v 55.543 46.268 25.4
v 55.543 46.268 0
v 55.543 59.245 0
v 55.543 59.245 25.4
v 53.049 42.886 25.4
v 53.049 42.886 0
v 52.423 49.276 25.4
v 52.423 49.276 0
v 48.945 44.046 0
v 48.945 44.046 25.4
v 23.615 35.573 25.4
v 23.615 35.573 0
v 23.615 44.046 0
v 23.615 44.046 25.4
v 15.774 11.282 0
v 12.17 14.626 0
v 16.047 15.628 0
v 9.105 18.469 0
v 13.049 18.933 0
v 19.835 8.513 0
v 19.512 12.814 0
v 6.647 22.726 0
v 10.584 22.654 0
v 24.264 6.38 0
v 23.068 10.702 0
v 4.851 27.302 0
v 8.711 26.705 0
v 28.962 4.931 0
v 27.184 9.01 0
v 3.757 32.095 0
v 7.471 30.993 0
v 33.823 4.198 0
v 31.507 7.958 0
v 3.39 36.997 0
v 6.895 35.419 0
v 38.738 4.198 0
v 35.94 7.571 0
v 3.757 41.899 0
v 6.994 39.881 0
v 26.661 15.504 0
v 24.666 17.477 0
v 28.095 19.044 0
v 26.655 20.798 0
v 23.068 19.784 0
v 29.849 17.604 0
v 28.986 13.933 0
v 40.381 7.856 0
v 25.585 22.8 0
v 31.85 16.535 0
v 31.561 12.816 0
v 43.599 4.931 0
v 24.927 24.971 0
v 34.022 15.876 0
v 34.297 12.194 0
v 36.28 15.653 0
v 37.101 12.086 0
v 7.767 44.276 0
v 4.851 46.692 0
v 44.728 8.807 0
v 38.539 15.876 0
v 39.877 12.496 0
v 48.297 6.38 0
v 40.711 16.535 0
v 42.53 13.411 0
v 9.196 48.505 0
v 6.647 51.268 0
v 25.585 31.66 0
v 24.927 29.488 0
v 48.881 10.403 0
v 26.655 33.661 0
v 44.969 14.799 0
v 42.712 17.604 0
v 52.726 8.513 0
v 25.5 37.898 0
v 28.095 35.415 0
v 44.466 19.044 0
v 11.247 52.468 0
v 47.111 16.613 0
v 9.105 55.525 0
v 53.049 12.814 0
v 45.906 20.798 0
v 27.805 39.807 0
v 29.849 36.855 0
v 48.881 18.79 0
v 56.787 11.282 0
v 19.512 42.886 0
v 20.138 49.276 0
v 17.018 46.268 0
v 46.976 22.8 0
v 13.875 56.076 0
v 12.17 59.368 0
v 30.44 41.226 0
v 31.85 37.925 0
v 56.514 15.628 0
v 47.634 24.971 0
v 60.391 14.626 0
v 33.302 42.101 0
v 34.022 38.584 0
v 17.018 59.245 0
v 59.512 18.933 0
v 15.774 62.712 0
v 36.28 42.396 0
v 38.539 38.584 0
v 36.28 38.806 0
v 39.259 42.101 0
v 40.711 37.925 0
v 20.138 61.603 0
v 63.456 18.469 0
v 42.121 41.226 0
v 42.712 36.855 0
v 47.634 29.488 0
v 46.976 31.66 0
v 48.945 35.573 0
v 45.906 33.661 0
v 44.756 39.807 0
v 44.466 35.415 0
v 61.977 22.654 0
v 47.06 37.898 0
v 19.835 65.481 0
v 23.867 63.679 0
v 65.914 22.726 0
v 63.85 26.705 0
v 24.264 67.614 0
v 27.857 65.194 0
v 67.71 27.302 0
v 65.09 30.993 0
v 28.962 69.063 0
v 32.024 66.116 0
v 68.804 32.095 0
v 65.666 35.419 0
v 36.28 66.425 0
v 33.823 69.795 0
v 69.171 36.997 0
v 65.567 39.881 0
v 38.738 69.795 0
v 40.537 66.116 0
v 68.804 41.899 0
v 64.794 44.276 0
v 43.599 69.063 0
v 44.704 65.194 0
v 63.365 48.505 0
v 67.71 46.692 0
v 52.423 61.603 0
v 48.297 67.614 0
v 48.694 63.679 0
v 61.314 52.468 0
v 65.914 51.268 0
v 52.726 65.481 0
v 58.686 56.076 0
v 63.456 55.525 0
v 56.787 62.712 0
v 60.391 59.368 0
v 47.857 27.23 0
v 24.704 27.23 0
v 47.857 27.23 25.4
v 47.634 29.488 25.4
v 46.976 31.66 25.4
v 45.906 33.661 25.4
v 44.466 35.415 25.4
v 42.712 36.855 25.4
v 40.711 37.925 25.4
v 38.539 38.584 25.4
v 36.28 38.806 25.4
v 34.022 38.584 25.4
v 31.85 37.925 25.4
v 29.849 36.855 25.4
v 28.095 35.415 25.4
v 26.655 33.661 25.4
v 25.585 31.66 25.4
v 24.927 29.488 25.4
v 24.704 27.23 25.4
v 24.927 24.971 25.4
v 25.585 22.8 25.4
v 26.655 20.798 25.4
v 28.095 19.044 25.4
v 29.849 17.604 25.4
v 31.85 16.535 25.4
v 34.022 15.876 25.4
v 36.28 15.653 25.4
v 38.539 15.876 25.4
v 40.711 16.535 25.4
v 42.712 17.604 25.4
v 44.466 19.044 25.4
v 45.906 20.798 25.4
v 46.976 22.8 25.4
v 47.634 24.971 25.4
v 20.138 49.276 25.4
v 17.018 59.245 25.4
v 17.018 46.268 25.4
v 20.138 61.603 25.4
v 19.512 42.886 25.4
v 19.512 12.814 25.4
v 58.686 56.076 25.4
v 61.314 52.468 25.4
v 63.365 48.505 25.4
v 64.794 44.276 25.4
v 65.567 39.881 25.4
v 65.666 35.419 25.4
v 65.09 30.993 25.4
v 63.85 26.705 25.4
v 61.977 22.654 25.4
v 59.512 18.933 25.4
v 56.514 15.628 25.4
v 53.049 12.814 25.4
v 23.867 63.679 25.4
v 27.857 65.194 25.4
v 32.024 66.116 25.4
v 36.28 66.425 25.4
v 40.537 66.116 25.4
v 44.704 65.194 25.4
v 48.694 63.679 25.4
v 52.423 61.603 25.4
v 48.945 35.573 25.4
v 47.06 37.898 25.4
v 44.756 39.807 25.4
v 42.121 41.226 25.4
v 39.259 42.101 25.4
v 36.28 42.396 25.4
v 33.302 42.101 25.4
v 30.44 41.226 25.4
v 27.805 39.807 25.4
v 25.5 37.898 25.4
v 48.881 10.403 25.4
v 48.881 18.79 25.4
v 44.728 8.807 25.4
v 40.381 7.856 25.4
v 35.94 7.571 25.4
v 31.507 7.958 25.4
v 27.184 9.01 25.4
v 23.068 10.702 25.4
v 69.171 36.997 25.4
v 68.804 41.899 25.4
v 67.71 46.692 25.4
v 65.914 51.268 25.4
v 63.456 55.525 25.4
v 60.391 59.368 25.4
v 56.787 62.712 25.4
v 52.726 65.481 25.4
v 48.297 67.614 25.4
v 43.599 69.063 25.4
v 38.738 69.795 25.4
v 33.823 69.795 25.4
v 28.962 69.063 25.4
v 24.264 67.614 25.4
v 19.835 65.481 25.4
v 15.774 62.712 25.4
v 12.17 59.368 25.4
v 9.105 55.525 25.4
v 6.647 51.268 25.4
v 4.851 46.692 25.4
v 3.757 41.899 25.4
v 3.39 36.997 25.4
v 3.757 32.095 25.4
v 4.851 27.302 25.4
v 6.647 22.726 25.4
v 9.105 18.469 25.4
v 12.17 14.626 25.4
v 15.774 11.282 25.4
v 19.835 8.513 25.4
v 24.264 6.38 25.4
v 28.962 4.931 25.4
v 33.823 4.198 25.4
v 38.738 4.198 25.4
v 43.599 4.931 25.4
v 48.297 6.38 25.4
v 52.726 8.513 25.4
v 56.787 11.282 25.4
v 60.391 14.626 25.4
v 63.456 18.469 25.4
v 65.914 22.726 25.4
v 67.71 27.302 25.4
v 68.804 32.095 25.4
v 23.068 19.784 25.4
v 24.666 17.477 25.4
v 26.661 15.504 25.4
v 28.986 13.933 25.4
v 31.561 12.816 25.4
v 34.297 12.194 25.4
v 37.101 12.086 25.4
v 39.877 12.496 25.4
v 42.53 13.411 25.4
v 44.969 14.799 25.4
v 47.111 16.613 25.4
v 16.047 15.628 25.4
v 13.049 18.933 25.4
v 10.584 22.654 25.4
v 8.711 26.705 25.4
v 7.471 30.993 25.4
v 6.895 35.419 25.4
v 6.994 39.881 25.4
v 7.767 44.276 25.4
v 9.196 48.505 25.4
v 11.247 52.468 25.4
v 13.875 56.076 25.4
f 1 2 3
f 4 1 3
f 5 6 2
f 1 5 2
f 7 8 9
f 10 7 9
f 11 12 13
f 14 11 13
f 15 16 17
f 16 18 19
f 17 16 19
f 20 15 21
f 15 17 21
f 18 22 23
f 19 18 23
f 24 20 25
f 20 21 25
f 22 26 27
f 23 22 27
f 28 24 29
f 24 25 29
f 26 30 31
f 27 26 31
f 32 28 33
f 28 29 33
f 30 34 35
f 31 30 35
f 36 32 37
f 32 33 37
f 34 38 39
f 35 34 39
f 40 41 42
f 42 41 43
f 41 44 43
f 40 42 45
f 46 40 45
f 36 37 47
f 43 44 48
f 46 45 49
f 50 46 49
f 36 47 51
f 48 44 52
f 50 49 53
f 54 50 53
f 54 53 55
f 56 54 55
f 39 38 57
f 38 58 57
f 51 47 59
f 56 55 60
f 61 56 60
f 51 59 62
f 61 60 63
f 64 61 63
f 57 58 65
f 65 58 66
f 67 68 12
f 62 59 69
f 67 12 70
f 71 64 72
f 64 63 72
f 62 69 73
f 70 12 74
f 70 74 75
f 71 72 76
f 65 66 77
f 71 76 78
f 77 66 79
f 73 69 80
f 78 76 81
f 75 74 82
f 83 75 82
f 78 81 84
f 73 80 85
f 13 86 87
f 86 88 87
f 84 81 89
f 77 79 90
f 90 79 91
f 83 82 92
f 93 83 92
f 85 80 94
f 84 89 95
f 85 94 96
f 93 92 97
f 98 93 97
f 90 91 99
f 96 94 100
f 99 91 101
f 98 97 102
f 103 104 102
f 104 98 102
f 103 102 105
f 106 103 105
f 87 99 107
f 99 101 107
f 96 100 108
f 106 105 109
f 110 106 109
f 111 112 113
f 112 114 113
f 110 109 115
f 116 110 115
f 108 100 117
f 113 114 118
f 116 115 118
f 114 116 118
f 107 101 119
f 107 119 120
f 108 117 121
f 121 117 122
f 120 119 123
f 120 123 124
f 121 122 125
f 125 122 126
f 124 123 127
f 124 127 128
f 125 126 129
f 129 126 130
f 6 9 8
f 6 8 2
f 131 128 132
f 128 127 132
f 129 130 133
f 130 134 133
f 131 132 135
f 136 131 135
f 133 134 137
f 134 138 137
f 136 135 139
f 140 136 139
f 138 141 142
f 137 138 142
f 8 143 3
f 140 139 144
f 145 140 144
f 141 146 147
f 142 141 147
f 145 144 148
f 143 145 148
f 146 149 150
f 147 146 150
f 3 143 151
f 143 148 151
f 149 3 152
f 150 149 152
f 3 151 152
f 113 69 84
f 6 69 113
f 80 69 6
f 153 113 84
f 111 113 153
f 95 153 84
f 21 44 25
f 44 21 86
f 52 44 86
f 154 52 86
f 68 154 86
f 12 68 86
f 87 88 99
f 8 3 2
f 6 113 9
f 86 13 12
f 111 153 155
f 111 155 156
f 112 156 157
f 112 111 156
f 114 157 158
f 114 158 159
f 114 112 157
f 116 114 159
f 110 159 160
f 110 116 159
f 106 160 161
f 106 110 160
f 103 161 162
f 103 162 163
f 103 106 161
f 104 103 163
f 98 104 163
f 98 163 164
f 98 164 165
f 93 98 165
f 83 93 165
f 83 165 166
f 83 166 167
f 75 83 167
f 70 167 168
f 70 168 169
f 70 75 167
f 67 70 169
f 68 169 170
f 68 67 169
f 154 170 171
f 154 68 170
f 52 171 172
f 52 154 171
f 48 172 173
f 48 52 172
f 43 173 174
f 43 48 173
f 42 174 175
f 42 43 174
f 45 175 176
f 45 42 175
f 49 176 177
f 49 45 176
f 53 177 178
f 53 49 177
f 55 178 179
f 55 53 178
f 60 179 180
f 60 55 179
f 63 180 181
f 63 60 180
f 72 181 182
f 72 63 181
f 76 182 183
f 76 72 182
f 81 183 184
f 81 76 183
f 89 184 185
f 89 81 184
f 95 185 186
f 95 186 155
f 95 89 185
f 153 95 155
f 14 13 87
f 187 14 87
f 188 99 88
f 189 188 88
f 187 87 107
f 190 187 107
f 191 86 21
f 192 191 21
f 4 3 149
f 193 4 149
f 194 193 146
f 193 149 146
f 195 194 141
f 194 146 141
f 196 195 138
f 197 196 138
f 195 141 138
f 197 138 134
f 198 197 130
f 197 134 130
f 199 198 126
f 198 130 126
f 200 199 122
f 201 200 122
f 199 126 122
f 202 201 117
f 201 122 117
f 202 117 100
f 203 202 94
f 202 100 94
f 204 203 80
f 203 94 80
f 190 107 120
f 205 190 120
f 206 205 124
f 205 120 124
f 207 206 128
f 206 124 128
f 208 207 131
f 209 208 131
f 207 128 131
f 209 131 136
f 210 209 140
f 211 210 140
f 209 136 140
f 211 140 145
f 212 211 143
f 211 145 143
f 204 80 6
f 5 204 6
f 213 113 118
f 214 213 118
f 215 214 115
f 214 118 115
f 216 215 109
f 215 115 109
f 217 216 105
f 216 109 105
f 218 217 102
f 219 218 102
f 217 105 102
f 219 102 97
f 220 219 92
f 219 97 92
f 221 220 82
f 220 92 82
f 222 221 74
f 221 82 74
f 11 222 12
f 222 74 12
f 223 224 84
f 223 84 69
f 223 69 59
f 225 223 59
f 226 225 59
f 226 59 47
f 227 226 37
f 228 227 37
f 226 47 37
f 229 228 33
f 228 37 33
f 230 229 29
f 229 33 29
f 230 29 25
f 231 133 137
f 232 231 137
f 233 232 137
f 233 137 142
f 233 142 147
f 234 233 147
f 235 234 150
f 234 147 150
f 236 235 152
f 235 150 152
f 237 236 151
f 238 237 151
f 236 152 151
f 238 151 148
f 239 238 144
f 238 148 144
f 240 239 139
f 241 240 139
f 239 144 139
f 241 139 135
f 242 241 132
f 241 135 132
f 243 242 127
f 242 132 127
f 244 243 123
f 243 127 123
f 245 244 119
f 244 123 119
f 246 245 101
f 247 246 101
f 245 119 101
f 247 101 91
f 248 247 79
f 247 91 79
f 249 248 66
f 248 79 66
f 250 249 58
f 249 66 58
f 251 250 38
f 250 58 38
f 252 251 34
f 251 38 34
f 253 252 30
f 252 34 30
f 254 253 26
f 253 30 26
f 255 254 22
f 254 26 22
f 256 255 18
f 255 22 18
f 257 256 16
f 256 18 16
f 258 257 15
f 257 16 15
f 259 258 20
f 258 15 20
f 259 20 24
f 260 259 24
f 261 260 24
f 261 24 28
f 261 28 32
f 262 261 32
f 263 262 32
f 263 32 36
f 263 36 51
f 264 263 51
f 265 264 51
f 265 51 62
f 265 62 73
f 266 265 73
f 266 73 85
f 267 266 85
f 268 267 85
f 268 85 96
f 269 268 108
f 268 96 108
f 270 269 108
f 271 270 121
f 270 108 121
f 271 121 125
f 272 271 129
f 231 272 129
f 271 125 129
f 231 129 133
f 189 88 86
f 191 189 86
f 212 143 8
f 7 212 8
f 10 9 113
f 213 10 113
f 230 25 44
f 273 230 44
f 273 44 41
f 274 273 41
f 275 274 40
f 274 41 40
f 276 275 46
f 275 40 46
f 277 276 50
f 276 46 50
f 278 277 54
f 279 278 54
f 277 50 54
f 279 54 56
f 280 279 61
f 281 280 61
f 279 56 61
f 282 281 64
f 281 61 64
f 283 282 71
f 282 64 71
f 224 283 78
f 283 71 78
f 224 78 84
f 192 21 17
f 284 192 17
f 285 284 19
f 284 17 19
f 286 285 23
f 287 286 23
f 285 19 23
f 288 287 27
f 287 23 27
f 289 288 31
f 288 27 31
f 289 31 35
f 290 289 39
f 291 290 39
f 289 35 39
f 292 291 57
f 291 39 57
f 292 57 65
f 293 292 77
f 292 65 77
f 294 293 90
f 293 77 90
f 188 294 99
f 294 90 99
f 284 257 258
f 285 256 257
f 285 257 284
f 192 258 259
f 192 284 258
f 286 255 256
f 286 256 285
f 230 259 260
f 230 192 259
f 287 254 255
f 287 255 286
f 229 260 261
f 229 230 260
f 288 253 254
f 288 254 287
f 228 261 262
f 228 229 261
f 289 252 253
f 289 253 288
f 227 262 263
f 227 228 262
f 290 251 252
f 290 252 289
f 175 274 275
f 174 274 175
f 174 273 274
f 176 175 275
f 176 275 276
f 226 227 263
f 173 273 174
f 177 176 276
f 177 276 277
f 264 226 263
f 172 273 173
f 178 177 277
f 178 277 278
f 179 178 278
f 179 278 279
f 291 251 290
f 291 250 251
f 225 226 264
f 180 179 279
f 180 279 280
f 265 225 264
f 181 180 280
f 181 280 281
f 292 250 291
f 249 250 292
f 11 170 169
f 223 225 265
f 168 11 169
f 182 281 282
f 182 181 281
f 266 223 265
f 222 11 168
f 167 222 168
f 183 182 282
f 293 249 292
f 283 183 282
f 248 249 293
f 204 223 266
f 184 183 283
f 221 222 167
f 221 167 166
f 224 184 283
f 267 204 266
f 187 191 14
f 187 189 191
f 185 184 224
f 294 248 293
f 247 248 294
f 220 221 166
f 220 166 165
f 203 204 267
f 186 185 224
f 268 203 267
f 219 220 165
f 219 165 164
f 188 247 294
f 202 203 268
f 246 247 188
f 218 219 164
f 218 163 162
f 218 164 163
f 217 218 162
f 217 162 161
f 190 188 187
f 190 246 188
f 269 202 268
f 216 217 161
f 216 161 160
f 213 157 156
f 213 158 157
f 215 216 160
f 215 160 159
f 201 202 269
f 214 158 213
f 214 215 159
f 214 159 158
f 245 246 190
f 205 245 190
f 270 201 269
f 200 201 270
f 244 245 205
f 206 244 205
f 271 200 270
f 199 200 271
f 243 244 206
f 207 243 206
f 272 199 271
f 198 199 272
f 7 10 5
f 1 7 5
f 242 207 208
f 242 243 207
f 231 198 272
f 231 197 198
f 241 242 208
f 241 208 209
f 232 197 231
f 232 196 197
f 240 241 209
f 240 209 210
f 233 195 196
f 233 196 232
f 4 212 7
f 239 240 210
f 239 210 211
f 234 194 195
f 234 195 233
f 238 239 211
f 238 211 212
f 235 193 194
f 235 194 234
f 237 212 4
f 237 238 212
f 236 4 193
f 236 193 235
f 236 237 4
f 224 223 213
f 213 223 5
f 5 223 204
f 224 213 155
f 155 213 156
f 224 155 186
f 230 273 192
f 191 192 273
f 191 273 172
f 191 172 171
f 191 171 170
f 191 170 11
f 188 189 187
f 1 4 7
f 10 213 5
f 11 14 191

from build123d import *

# Parameters (mm, degrees)
F0_R     = 32.890522
F0_R_2   = 11.576292
F1_DEPTH = 25.4


with BuildPart() as f1:
    # F0 (on Top) → F1 (new body)
    with BuildSketch(Plane.XY):
        with Locations((36.280491, 36.996896)):
            Circle(F0_R)
        with BuildLine():
            ThreePointArc((48.881385, 10.403025), (35.940113, 7.570706), (23.067818, 10.701616))
            Line((23.067818, 10.701616), (23.067818, 19.783714))
            ThreePointArc((23.067818, 19.783714), (35.696865, 12.074644), (48.881385, 18.78963))
            Line((48.881385, 18.78963), (48.881385, 10.403025))
        make_face(mode=Mode.SUBTRACT)
        with BuildLine():
            Line((19.511687, 42.886119), (19.511687, 12.813768))
            ThreePointArc((19.511687, 12.813768), (6.89469, 35.41855), (17.017825, 59.244731))
            Line((17.017825, 59.244731), (17.017825, 46.268191))
            Line((17.017825, 46.268191), (19.511687, 42.886119))
        make_face(mode=Mode.SUBTRACT)
        with Locations((36.280491, 27.229772)):
            Circle(F0_R_2, mode=Mode.SUBTRACT)
        with BuildLine():
            Line((53.049296, 42.886119), (55.543158, 46.268191))
            Line((55.543158, 46.268191), (55.543158, 59.244731))
            ThreePointArc((55.543158, 59.244731), (65.666293, 35.41855), (53.049296, 12.813768))
            Line((53.049296, 12.813768), (53.049296, 42.886119))
        make_face(mode=Mode.SUBTRACT)
        with BuildLine():
            Line((20.1381, 49.27608), (20.1381, 61.602581))
            ThreePointArc((20.1381, 61.602581), (36.280491, 66.425054), (52.422883, 61.602581))
            Line((52.422883, 61.602581), (52.422883, 49.27608))
            Line((52.422883, 49.27608), (48.945498, 44.046022))
            Line((48.945498, 44.046022), (48.945498, 35.573399))
            ThreePointArc((48.945498, 35.573399), (36.280491, 42.396133), (23.615485, 35.573399))
            Line((23.615485, 35.573399), (23.615485, 44.046022))
            Line((23.615485, 44.046022), (20.1381, 49.27608))
        make_face(mode=Mode.SUBTRACT)
    extrude(amount=F1_DEPTH)


solid = f1.part
